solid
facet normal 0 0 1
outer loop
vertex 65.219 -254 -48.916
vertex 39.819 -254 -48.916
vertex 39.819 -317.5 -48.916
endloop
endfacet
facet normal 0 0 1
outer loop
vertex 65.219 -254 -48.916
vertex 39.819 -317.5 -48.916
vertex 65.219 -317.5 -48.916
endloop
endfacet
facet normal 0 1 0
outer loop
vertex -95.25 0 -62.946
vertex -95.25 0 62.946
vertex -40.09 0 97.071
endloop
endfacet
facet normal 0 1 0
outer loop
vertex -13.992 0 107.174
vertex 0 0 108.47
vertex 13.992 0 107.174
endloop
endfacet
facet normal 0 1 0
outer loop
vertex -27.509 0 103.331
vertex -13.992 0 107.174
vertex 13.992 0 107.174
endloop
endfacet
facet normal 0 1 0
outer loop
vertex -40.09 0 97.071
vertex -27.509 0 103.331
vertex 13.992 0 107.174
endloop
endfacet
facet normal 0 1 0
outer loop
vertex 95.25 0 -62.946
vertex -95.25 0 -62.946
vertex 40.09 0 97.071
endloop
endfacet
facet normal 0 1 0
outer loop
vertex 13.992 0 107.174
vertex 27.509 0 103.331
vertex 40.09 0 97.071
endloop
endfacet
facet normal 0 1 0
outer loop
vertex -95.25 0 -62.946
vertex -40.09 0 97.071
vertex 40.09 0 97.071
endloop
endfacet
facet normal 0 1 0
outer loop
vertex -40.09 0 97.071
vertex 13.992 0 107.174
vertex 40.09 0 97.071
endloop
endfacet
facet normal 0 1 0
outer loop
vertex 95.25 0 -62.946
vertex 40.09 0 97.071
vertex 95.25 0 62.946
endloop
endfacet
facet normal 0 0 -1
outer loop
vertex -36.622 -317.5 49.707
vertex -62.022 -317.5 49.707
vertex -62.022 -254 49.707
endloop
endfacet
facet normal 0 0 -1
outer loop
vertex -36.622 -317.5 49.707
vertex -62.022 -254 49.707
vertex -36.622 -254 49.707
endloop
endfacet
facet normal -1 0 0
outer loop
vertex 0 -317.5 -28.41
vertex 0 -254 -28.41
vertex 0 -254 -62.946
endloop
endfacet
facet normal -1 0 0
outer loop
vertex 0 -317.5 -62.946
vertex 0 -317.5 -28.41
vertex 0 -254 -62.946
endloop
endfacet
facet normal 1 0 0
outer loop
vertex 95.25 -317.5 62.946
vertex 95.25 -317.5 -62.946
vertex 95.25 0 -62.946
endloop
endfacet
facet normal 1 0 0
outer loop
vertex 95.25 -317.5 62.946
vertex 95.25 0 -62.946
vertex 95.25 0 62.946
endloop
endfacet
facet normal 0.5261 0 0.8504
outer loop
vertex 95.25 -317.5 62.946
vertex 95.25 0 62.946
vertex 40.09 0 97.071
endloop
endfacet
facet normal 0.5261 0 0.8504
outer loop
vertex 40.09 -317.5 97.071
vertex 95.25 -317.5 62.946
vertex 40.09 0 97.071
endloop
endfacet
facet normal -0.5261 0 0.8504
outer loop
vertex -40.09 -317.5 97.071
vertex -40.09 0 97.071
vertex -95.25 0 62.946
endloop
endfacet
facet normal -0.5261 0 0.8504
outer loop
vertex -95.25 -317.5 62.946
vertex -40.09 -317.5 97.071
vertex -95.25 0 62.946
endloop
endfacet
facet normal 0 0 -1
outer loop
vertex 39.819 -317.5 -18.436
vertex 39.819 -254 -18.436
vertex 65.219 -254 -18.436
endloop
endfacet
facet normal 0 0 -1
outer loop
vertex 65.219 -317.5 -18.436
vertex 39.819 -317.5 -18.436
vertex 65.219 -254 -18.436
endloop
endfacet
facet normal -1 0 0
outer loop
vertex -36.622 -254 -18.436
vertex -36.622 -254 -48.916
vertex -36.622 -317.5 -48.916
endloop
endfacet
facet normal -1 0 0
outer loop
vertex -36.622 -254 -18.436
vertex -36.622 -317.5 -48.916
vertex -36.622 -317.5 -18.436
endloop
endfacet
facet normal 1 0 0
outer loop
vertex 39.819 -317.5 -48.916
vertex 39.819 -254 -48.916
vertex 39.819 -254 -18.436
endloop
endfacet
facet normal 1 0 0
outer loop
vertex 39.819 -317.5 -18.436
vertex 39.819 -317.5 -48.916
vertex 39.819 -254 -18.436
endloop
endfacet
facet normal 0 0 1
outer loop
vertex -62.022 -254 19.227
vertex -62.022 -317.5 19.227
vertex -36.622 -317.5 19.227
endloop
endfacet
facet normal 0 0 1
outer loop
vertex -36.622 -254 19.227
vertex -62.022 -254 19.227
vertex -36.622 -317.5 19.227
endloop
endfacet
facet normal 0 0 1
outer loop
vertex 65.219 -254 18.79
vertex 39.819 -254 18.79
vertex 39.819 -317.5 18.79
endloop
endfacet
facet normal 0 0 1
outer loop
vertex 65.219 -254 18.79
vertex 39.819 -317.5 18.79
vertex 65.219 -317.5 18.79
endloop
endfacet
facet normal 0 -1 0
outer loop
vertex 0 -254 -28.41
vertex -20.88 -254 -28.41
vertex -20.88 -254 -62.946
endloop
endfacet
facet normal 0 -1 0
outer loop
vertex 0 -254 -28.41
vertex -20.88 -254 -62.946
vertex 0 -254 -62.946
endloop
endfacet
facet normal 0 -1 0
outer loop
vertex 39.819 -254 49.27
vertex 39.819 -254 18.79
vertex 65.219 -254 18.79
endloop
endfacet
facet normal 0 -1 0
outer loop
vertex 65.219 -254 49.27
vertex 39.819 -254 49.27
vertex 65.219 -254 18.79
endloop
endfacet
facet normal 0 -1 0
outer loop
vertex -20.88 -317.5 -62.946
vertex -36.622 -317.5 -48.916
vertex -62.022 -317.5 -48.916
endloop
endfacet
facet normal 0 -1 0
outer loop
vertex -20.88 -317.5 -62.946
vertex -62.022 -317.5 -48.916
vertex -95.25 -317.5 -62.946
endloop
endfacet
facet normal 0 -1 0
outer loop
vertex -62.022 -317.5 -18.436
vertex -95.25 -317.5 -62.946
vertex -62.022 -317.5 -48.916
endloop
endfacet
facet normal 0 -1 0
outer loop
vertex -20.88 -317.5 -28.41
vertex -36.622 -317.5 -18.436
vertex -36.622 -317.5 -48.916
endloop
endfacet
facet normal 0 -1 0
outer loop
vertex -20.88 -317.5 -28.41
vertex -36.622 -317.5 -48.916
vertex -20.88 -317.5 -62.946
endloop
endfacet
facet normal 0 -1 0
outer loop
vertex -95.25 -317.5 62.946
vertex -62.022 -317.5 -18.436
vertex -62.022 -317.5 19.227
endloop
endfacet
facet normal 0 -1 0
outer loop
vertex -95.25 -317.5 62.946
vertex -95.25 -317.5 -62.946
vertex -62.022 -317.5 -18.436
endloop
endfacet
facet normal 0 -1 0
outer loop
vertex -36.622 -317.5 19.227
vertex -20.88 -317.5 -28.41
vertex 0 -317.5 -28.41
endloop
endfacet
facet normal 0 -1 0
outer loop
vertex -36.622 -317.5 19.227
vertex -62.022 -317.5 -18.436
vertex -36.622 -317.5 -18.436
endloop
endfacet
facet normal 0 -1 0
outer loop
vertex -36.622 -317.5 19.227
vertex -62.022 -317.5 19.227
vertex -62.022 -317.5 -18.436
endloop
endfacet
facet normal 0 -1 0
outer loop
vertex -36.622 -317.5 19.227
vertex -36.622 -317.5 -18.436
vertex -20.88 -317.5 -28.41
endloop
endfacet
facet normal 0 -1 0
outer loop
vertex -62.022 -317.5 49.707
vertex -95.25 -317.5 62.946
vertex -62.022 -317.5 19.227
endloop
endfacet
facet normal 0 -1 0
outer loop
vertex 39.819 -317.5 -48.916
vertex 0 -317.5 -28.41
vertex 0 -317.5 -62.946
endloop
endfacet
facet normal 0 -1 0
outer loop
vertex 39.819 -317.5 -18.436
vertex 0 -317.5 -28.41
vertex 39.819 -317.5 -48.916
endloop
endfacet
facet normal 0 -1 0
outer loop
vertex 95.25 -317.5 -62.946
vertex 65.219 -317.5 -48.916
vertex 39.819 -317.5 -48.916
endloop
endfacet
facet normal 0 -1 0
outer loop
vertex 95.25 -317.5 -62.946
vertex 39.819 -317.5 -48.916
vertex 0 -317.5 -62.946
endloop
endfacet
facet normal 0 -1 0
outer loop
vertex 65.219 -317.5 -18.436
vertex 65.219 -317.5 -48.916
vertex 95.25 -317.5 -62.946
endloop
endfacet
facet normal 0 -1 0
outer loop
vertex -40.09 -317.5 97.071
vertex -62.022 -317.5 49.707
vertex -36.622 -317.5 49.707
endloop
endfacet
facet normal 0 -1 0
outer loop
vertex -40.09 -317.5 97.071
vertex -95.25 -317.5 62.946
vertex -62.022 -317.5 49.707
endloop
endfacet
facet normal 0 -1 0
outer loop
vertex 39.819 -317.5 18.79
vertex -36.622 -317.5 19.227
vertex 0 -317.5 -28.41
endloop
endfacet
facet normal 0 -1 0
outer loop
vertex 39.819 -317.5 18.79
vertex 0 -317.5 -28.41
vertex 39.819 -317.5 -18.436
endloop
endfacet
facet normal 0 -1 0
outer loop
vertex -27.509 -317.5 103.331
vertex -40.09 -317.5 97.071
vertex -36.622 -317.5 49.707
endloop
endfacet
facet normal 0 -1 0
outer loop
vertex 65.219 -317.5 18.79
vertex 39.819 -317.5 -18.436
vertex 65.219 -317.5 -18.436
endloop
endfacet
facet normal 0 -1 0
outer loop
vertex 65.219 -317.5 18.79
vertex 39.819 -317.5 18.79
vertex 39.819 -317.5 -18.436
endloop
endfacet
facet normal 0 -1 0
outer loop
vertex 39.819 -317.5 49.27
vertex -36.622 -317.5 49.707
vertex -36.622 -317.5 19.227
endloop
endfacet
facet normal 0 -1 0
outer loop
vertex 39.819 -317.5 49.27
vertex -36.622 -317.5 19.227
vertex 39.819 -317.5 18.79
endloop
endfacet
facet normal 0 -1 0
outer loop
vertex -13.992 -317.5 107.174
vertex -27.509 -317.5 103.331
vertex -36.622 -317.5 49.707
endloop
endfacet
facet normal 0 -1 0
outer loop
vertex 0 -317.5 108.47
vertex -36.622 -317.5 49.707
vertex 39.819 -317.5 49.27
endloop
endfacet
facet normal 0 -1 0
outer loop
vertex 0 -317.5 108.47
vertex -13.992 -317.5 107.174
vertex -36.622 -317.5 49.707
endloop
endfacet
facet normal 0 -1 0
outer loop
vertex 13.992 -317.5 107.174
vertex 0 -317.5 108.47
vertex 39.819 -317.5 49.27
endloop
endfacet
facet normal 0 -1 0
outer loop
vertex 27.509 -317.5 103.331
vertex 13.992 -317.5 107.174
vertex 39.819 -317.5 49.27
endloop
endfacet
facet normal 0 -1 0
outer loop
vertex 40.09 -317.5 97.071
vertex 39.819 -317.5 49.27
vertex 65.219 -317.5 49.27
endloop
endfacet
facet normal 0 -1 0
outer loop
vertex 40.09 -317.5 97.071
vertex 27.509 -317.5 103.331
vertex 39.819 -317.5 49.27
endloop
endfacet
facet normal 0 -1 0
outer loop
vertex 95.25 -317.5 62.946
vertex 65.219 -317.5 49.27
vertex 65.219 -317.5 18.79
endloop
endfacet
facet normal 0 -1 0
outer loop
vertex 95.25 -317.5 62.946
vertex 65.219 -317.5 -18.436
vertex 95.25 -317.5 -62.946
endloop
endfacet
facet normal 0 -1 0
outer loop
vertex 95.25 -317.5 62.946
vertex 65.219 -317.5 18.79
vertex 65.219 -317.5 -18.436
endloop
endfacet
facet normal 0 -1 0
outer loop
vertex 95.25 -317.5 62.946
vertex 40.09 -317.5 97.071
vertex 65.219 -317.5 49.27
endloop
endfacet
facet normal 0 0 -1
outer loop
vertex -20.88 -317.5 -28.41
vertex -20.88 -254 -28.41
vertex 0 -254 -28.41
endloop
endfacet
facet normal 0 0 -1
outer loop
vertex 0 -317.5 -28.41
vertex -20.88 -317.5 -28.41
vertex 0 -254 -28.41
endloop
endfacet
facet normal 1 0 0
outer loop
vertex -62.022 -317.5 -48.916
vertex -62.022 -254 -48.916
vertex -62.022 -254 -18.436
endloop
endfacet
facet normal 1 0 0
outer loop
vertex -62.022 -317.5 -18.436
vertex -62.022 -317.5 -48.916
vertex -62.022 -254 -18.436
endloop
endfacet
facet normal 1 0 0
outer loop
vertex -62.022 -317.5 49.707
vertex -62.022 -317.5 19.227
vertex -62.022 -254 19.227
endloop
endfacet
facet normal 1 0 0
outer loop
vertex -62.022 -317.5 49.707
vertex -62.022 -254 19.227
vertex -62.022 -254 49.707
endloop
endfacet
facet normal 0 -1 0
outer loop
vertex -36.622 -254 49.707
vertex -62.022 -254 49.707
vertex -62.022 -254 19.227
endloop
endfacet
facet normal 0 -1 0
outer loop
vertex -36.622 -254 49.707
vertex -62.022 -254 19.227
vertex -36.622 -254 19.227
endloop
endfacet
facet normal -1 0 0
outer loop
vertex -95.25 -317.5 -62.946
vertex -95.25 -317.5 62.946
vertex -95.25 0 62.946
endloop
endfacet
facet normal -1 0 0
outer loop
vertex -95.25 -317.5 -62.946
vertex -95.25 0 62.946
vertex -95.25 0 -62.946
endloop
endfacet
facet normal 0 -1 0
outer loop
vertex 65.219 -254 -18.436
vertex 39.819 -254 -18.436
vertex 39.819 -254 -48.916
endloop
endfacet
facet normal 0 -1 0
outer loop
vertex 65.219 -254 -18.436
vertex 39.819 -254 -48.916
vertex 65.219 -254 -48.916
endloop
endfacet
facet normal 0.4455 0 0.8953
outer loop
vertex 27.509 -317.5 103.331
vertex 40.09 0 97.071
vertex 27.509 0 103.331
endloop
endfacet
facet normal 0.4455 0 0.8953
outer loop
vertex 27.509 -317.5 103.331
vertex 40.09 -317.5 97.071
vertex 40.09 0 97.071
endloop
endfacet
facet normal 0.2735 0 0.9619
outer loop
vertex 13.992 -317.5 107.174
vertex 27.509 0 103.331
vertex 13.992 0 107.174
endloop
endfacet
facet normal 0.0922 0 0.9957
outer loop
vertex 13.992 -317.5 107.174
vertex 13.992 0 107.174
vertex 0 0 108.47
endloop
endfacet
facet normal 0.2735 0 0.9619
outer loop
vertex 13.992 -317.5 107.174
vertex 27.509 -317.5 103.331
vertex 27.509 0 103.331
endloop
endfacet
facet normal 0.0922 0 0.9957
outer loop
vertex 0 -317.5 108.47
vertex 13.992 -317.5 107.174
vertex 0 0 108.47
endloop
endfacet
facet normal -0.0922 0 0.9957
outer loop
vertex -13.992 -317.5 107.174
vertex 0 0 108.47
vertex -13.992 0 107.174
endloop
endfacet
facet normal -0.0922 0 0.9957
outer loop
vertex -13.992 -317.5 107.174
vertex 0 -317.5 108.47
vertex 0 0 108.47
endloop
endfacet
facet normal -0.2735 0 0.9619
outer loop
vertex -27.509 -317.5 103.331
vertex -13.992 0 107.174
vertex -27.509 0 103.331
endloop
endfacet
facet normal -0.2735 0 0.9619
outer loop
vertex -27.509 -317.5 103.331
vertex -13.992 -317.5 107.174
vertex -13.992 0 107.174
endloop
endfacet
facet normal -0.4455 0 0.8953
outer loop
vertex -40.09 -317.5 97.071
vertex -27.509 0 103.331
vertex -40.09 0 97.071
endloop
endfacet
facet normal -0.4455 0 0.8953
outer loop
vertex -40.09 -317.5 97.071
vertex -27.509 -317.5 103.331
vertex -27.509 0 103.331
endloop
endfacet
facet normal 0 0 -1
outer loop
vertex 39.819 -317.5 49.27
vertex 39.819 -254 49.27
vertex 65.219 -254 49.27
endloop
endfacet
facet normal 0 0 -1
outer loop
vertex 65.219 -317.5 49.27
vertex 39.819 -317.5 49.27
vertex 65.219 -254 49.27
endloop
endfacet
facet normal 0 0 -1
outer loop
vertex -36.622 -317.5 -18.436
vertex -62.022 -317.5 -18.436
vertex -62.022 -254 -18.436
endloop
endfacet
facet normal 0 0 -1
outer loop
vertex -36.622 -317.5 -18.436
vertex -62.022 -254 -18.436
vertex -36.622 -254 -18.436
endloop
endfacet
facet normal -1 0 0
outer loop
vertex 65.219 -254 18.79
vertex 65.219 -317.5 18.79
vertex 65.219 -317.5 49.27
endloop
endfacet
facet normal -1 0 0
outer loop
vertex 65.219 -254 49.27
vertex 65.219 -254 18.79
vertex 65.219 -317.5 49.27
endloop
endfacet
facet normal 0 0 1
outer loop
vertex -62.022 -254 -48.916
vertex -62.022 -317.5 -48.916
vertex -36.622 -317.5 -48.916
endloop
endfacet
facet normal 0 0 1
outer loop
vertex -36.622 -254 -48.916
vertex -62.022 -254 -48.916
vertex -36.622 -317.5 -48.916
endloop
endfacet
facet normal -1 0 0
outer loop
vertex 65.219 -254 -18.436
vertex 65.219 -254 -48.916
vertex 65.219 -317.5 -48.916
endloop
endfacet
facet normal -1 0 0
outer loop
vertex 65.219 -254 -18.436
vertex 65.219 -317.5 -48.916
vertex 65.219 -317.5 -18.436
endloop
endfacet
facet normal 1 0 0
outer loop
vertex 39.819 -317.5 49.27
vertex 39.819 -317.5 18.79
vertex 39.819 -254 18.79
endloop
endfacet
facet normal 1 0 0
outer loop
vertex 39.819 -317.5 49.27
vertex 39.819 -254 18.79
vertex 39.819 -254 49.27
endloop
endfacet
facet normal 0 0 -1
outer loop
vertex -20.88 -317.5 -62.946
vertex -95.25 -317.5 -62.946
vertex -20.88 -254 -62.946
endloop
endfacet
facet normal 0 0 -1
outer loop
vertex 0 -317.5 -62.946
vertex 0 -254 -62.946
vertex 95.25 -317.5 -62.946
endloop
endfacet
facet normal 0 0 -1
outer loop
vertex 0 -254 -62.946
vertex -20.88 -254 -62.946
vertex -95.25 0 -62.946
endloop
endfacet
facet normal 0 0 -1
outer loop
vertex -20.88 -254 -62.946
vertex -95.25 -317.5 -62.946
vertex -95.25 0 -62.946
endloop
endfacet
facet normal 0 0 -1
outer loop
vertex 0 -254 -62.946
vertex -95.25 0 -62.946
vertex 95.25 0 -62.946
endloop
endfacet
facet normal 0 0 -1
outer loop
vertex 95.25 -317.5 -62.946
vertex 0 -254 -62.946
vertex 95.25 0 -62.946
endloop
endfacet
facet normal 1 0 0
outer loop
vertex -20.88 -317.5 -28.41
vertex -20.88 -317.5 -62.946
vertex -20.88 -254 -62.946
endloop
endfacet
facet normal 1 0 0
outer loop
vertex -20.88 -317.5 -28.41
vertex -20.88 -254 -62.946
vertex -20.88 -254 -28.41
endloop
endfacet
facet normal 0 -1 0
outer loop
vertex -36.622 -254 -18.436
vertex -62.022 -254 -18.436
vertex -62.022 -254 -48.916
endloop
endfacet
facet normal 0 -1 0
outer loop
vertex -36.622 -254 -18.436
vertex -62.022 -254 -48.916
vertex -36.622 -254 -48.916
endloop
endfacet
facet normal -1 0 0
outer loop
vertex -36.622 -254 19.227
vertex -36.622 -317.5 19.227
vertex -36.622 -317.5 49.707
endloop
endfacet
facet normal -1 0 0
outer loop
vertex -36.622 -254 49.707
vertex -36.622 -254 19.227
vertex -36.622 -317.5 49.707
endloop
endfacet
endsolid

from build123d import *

# Parameters (mm, degrees)
F0_W     = 25.4
F0_H     = 30.48
F1_DEPTH = 317.5
F0_W_2   = 20.8801385015
F0_H_2   = 34.5365251615
F2_DEPTH = 254
F3_R     = 76.2


with BuildPart() as f1:
    # F0 (on Front) → F1 (new body)
    with BuildSketch(Plane.XZ):
        Polygon((0, 121.8727435376), (-95.25, 62.9464942231), (95.25, 62.9464942231), align=None)
        Polygon((95.25, 62.9464942231), (-95.25, 62.9464942231), (-95.25, -62.9464942231), (-20.8801385015, -62.9464942231), (-20.8801385015, -28.4099690616), (0, -28.4099690616), (0, -62.9464942231), (95.25, -62.9464942231), align=None)
        with Locations((-49.3217527476, -33.6759798229)):
            Rectangle(F0_W, F0_H, mode=Mode.SUBTRACT)
        with Locations((52.5188967586, -33.6759798229)):
            Rectangle(F0_W, F0_H, mode=Mode.SUBTRACT)
        with Locations((-49.3217527476, 34.4667454919)):
            Rectangle(F0_W, F0_H, mode=Mode.SUBTRACT)
        with Locations((52.5188967586, 34.0303108096)):
            Rectangle(F0_W, F0_H, mode=Mode.SUBTRACT)
    extrude(amount=F1_DEPTH)

    # F0 (on Front) → F2 (join)
    with BuildSketch(Plane.XZ):
        with Locations((52.5188967586, 34.0303108096)):
            Rectangle(F0_W, F0_H)
        with Locations((-49.3217527476, 34.4667454919)):
            Rectangle(F0_W, F0_H)
        with Locations((52.5188967586, -33.6759798229)):
            Rectangle(F0_W, F0_H)
        with Locations((-49.3217527476, -33.6759798229)):
            Rectangle(F0_W, F0_H)
        with Locations((-10.4400692508, -45.6782316424)):
            Rectangle(F0_W_2, F0_H_2)
    extrude(amount=F2_DEPTH)

    # F3
    f3_edges = [f1.edges().sort_by_distance(p)[0] for p in [
        (0, -158.75, 121.872744),
    ]]
    fillet(f3_edges, radius=F3_R)


solid = f1.part
